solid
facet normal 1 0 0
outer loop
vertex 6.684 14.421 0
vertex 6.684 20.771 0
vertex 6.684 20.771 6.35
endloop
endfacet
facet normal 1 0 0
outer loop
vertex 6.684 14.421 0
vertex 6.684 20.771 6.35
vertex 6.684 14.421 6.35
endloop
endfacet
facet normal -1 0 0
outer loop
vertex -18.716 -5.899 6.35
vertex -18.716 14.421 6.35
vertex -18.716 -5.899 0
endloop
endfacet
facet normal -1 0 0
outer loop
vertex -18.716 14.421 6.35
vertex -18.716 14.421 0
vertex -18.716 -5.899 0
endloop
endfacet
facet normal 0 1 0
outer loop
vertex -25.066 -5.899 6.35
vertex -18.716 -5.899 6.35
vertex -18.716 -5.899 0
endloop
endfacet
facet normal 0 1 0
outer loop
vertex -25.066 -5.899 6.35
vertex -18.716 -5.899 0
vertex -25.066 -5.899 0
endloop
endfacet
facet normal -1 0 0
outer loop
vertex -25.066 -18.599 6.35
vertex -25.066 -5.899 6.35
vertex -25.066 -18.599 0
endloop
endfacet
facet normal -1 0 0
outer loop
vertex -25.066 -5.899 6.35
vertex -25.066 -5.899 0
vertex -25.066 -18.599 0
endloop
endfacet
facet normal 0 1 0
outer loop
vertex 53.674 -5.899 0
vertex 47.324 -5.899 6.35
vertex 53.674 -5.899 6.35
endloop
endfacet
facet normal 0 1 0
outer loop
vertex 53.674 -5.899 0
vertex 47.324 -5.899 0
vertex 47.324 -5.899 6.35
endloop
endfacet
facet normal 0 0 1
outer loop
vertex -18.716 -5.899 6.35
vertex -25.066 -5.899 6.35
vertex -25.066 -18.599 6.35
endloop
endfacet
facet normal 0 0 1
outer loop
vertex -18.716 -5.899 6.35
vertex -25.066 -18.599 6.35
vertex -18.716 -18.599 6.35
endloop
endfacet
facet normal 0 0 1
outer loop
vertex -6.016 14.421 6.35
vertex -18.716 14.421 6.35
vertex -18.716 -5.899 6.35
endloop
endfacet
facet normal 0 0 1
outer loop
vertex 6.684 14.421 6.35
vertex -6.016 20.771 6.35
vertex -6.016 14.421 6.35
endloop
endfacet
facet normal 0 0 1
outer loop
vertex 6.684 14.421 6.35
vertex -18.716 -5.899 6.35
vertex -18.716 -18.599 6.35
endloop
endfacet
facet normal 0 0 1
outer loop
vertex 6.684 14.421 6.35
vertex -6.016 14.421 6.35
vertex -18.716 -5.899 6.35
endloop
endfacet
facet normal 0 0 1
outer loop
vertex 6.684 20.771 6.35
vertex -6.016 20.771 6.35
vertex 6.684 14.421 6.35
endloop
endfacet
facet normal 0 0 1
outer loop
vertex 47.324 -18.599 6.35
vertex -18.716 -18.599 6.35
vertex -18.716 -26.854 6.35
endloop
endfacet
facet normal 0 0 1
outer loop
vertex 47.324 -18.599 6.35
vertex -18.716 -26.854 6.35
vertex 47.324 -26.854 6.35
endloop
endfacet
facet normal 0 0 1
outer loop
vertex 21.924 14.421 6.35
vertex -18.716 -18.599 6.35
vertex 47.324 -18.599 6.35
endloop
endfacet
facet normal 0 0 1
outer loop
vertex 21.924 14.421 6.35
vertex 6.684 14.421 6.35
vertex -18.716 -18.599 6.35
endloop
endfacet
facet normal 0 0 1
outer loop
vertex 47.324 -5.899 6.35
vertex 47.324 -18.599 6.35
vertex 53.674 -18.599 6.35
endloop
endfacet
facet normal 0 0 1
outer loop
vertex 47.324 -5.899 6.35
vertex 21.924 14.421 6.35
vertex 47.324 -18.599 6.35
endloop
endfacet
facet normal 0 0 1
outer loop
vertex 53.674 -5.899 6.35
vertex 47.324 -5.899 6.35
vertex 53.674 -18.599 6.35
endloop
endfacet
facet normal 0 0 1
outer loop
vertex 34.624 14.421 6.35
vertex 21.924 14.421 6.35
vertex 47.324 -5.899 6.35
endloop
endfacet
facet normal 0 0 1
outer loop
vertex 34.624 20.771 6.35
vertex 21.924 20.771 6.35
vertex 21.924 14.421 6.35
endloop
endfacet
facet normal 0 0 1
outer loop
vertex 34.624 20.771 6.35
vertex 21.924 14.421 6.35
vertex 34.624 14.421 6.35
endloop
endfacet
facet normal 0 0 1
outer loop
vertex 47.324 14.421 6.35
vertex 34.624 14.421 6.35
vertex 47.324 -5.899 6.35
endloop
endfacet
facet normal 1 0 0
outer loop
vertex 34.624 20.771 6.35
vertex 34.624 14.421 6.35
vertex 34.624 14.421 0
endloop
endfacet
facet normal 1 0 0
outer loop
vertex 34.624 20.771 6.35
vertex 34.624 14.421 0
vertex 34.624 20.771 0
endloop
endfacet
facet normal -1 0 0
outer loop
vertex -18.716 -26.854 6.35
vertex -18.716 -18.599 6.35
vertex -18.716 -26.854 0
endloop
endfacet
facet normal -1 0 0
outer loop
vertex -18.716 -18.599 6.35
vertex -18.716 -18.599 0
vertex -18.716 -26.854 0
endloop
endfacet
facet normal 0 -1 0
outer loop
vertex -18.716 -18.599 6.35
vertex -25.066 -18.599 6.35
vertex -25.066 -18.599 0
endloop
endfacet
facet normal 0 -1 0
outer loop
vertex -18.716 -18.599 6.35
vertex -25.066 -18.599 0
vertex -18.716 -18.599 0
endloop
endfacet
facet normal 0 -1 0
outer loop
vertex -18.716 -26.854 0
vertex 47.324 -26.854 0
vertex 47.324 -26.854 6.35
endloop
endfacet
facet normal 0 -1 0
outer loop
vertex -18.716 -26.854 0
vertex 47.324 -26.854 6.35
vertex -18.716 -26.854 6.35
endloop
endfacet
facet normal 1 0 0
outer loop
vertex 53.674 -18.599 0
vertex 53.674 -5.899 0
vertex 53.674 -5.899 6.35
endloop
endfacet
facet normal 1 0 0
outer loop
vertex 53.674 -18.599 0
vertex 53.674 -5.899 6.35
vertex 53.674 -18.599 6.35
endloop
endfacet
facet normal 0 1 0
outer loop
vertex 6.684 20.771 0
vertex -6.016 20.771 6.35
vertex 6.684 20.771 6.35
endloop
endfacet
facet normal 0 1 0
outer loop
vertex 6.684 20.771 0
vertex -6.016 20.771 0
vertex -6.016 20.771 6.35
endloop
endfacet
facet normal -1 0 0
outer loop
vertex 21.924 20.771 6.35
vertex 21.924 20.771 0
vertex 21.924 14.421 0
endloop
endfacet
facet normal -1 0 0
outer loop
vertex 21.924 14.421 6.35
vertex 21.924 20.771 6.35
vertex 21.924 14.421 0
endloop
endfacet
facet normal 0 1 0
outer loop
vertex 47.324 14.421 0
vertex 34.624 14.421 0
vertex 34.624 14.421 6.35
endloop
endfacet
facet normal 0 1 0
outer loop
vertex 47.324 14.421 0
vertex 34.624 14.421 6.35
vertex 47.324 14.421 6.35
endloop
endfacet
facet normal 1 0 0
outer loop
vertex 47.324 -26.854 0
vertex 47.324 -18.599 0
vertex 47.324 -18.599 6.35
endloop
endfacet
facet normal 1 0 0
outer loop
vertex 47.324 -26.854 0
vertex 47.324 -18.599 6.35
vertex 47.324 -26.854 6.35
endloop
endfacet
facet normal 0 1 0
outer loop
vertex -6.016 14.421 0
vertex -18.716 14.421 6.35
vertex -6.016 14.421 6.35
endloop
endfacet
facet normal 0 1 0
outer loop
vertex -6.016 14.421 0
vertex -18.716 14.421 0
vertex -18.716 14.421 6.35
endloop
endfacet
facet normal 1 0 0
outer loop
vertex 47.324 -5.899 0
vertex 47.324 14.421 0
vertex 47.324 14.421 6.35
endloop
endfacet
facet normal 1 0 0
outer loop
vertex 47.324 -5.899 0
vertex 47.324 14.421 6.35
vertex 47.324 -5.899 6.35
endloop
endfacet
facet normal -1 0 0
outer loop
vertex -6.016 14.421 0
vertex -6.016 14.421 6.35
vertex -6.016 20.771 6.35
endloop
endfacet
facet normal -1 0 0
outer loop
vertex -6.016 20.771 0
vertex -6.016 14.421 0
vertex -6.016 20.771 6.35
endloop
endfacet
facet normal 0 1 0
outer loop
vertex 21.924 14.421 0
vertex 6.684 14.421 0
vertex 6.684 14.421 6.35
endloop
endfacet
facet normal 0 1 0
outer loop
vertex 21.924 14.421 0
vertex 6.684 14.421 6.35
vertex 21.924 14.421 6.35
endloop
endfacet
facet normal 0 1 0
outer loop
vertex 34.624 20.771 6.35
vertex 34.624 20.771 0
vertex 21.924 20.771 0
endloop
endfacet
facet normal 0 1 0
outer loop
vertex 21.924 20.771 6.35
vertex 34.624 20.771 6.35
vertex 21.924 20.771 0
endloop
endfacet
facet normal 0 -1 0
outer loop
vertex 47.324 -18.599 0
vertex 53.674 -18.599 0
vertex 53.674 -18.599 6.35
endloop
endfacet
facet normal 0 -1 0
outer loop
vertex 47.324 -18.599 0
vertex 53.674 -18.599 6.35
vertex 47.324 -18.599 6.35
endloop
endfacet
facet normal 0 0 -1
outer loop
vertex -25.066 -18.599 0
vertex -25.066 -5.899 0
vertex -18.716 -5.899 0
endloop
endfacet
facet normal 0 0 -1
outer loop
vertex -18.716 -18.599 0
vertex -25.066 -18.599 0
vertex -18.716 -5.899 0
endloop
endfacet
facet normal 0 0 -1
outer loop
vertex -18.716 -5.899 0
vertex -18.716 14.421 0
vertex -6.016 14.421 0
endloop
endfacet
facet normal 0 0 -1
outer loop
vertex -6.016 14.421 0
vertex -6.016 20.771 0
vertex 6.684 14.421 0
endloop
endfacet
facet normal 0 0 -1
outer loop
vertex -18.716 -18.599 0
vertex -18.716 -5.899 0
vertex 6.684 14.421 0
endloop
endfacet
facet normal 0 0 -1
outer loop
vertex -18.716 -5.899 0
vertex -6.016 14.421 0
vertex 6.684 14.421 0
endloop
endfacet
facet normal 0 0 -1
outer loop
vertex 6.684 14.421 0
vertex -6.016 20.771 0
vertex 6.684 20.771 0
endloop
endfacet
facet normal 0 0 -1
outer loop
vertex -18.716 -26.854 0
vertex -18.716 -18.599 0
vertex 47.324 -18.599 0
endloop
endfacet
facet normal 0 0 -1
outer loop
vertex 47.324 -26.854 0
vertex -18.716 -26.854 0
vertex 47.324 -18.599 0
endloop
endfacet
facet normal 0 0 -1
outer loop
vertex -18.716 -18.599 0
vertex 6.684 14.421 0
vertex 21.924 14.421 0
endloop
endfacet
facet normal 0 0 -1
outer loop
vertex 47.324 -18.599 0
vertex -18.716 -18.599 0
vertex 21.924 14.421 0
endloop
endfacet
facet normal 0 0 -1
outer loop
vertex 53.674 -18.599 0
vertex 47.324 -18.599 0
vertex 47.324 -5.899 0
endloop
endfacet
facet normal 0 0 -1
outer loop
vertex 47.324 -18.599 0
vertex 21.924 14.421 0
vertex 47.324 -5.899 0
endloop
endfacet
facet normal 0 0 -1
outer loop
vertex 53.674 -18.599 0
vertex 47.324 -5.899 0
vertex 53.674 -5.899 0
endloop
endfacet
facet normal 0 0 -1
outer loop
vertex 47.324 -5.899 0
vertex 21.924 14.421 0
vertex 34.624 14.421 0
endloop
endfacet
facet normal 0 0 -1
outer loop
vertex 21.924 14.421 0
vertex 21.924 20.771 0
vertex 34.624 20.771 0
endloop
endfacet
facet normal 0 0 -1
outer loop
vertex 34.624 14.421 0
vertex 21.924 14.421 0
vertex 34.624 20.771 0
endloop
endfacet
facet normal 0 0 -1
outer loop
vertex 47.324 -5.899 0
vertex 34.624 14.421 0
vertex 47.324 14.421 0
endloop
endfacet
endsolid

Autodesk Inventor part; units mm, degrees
ref_plane "YZ Plane" through (0, 0, 0) normal (1, 0, 0) x (0, 1, 0)
ref_plane "XZ Plane" through (0, 0, 0) normal (0, 1, 0) x (-1, 0, 0)
ref_plane "XY Plane" through (0, 0, 0) normal (0, 0, 1) x (1, 0, 0)
sketch "Sketch1" plane through (0, 0, 0) normal (0, 0, 1) x (1, 0, 0)
  line L0 (-18.7161, 14.4213) -> (-18.7161, -26.8537)
  line L1 (-18.7161, 14.4213) -> (47.3239, 14.4213)
  line L2 (47.3239, 14.4213) -> (47.3239, -26.8537)
  line L3 (47.3239, -26.8537) -> (-18.7161, -26.8537)
  line L4 (-18.7161, 14.4213) -> (-6.0161, 14.4213)
  line L5 (-6.0161, 14.4213) -> (-6.0161, 20.7713)
  line L6 (-6.0161, 20.7713) -> (6.6839, 20.7713)
  line L7 (6.6839, 20.7713) -> (6.6839, 14.4213)
  line L8 (47.3239, 14.4213) -> (34.6239, 14.4213)
  line L9 (34.6239, 14.4213) -> (34.6239, 20.7713)
  line L10 (34.6239, 20.7713) -> (21.9239, 20.7713)
  line L11 (21.9239, 20.7713) -> (21.9239, 14.4213)
  line L12 (-18.7161, 14.4213) -> (-18.7161, -5.8987)
  line L13 (-18.7161, -5.8987) -> (-25.0661, -5.8987)
  line L14 (-25.0661, -5.8987) -> (-25.0661, -18.5987)
  line L15 (-25.0661, -18.5987) -> (-18.7161, -18.5987)
  line L16 (47.3239, 14.4213) -> (47.3239, -5.8987)
  line L17 (47.3239, -5.8987) -> (53.6739, -5.8987)
  line L18 (53.6739, -5.8987) -> (53.6739, -18.5987)
  line L19 (53.6739, -18.5987) -> (47.3239, -18.5987)
  point P0 (0, 0)
  dimension "d0" = 41.275
  dimension "d1" = 66.04
  dimension "d2" = 12.7
  dimension "d3" = 6.35
  dimension "d4" = 12.7
  dimension "d5" = 12.7
  dimension "d6" = 12.7
  dimension "d7" = 20.32
  dimension "d8" = 6.35
  dimension "d9" = 12.7
  dimension "d10" = 20.32
  dimension "d11" = 6.35
extrude "Extrusion1" add sketch "Sketch1" along normal blind 6.35
properties part number "support 2"
